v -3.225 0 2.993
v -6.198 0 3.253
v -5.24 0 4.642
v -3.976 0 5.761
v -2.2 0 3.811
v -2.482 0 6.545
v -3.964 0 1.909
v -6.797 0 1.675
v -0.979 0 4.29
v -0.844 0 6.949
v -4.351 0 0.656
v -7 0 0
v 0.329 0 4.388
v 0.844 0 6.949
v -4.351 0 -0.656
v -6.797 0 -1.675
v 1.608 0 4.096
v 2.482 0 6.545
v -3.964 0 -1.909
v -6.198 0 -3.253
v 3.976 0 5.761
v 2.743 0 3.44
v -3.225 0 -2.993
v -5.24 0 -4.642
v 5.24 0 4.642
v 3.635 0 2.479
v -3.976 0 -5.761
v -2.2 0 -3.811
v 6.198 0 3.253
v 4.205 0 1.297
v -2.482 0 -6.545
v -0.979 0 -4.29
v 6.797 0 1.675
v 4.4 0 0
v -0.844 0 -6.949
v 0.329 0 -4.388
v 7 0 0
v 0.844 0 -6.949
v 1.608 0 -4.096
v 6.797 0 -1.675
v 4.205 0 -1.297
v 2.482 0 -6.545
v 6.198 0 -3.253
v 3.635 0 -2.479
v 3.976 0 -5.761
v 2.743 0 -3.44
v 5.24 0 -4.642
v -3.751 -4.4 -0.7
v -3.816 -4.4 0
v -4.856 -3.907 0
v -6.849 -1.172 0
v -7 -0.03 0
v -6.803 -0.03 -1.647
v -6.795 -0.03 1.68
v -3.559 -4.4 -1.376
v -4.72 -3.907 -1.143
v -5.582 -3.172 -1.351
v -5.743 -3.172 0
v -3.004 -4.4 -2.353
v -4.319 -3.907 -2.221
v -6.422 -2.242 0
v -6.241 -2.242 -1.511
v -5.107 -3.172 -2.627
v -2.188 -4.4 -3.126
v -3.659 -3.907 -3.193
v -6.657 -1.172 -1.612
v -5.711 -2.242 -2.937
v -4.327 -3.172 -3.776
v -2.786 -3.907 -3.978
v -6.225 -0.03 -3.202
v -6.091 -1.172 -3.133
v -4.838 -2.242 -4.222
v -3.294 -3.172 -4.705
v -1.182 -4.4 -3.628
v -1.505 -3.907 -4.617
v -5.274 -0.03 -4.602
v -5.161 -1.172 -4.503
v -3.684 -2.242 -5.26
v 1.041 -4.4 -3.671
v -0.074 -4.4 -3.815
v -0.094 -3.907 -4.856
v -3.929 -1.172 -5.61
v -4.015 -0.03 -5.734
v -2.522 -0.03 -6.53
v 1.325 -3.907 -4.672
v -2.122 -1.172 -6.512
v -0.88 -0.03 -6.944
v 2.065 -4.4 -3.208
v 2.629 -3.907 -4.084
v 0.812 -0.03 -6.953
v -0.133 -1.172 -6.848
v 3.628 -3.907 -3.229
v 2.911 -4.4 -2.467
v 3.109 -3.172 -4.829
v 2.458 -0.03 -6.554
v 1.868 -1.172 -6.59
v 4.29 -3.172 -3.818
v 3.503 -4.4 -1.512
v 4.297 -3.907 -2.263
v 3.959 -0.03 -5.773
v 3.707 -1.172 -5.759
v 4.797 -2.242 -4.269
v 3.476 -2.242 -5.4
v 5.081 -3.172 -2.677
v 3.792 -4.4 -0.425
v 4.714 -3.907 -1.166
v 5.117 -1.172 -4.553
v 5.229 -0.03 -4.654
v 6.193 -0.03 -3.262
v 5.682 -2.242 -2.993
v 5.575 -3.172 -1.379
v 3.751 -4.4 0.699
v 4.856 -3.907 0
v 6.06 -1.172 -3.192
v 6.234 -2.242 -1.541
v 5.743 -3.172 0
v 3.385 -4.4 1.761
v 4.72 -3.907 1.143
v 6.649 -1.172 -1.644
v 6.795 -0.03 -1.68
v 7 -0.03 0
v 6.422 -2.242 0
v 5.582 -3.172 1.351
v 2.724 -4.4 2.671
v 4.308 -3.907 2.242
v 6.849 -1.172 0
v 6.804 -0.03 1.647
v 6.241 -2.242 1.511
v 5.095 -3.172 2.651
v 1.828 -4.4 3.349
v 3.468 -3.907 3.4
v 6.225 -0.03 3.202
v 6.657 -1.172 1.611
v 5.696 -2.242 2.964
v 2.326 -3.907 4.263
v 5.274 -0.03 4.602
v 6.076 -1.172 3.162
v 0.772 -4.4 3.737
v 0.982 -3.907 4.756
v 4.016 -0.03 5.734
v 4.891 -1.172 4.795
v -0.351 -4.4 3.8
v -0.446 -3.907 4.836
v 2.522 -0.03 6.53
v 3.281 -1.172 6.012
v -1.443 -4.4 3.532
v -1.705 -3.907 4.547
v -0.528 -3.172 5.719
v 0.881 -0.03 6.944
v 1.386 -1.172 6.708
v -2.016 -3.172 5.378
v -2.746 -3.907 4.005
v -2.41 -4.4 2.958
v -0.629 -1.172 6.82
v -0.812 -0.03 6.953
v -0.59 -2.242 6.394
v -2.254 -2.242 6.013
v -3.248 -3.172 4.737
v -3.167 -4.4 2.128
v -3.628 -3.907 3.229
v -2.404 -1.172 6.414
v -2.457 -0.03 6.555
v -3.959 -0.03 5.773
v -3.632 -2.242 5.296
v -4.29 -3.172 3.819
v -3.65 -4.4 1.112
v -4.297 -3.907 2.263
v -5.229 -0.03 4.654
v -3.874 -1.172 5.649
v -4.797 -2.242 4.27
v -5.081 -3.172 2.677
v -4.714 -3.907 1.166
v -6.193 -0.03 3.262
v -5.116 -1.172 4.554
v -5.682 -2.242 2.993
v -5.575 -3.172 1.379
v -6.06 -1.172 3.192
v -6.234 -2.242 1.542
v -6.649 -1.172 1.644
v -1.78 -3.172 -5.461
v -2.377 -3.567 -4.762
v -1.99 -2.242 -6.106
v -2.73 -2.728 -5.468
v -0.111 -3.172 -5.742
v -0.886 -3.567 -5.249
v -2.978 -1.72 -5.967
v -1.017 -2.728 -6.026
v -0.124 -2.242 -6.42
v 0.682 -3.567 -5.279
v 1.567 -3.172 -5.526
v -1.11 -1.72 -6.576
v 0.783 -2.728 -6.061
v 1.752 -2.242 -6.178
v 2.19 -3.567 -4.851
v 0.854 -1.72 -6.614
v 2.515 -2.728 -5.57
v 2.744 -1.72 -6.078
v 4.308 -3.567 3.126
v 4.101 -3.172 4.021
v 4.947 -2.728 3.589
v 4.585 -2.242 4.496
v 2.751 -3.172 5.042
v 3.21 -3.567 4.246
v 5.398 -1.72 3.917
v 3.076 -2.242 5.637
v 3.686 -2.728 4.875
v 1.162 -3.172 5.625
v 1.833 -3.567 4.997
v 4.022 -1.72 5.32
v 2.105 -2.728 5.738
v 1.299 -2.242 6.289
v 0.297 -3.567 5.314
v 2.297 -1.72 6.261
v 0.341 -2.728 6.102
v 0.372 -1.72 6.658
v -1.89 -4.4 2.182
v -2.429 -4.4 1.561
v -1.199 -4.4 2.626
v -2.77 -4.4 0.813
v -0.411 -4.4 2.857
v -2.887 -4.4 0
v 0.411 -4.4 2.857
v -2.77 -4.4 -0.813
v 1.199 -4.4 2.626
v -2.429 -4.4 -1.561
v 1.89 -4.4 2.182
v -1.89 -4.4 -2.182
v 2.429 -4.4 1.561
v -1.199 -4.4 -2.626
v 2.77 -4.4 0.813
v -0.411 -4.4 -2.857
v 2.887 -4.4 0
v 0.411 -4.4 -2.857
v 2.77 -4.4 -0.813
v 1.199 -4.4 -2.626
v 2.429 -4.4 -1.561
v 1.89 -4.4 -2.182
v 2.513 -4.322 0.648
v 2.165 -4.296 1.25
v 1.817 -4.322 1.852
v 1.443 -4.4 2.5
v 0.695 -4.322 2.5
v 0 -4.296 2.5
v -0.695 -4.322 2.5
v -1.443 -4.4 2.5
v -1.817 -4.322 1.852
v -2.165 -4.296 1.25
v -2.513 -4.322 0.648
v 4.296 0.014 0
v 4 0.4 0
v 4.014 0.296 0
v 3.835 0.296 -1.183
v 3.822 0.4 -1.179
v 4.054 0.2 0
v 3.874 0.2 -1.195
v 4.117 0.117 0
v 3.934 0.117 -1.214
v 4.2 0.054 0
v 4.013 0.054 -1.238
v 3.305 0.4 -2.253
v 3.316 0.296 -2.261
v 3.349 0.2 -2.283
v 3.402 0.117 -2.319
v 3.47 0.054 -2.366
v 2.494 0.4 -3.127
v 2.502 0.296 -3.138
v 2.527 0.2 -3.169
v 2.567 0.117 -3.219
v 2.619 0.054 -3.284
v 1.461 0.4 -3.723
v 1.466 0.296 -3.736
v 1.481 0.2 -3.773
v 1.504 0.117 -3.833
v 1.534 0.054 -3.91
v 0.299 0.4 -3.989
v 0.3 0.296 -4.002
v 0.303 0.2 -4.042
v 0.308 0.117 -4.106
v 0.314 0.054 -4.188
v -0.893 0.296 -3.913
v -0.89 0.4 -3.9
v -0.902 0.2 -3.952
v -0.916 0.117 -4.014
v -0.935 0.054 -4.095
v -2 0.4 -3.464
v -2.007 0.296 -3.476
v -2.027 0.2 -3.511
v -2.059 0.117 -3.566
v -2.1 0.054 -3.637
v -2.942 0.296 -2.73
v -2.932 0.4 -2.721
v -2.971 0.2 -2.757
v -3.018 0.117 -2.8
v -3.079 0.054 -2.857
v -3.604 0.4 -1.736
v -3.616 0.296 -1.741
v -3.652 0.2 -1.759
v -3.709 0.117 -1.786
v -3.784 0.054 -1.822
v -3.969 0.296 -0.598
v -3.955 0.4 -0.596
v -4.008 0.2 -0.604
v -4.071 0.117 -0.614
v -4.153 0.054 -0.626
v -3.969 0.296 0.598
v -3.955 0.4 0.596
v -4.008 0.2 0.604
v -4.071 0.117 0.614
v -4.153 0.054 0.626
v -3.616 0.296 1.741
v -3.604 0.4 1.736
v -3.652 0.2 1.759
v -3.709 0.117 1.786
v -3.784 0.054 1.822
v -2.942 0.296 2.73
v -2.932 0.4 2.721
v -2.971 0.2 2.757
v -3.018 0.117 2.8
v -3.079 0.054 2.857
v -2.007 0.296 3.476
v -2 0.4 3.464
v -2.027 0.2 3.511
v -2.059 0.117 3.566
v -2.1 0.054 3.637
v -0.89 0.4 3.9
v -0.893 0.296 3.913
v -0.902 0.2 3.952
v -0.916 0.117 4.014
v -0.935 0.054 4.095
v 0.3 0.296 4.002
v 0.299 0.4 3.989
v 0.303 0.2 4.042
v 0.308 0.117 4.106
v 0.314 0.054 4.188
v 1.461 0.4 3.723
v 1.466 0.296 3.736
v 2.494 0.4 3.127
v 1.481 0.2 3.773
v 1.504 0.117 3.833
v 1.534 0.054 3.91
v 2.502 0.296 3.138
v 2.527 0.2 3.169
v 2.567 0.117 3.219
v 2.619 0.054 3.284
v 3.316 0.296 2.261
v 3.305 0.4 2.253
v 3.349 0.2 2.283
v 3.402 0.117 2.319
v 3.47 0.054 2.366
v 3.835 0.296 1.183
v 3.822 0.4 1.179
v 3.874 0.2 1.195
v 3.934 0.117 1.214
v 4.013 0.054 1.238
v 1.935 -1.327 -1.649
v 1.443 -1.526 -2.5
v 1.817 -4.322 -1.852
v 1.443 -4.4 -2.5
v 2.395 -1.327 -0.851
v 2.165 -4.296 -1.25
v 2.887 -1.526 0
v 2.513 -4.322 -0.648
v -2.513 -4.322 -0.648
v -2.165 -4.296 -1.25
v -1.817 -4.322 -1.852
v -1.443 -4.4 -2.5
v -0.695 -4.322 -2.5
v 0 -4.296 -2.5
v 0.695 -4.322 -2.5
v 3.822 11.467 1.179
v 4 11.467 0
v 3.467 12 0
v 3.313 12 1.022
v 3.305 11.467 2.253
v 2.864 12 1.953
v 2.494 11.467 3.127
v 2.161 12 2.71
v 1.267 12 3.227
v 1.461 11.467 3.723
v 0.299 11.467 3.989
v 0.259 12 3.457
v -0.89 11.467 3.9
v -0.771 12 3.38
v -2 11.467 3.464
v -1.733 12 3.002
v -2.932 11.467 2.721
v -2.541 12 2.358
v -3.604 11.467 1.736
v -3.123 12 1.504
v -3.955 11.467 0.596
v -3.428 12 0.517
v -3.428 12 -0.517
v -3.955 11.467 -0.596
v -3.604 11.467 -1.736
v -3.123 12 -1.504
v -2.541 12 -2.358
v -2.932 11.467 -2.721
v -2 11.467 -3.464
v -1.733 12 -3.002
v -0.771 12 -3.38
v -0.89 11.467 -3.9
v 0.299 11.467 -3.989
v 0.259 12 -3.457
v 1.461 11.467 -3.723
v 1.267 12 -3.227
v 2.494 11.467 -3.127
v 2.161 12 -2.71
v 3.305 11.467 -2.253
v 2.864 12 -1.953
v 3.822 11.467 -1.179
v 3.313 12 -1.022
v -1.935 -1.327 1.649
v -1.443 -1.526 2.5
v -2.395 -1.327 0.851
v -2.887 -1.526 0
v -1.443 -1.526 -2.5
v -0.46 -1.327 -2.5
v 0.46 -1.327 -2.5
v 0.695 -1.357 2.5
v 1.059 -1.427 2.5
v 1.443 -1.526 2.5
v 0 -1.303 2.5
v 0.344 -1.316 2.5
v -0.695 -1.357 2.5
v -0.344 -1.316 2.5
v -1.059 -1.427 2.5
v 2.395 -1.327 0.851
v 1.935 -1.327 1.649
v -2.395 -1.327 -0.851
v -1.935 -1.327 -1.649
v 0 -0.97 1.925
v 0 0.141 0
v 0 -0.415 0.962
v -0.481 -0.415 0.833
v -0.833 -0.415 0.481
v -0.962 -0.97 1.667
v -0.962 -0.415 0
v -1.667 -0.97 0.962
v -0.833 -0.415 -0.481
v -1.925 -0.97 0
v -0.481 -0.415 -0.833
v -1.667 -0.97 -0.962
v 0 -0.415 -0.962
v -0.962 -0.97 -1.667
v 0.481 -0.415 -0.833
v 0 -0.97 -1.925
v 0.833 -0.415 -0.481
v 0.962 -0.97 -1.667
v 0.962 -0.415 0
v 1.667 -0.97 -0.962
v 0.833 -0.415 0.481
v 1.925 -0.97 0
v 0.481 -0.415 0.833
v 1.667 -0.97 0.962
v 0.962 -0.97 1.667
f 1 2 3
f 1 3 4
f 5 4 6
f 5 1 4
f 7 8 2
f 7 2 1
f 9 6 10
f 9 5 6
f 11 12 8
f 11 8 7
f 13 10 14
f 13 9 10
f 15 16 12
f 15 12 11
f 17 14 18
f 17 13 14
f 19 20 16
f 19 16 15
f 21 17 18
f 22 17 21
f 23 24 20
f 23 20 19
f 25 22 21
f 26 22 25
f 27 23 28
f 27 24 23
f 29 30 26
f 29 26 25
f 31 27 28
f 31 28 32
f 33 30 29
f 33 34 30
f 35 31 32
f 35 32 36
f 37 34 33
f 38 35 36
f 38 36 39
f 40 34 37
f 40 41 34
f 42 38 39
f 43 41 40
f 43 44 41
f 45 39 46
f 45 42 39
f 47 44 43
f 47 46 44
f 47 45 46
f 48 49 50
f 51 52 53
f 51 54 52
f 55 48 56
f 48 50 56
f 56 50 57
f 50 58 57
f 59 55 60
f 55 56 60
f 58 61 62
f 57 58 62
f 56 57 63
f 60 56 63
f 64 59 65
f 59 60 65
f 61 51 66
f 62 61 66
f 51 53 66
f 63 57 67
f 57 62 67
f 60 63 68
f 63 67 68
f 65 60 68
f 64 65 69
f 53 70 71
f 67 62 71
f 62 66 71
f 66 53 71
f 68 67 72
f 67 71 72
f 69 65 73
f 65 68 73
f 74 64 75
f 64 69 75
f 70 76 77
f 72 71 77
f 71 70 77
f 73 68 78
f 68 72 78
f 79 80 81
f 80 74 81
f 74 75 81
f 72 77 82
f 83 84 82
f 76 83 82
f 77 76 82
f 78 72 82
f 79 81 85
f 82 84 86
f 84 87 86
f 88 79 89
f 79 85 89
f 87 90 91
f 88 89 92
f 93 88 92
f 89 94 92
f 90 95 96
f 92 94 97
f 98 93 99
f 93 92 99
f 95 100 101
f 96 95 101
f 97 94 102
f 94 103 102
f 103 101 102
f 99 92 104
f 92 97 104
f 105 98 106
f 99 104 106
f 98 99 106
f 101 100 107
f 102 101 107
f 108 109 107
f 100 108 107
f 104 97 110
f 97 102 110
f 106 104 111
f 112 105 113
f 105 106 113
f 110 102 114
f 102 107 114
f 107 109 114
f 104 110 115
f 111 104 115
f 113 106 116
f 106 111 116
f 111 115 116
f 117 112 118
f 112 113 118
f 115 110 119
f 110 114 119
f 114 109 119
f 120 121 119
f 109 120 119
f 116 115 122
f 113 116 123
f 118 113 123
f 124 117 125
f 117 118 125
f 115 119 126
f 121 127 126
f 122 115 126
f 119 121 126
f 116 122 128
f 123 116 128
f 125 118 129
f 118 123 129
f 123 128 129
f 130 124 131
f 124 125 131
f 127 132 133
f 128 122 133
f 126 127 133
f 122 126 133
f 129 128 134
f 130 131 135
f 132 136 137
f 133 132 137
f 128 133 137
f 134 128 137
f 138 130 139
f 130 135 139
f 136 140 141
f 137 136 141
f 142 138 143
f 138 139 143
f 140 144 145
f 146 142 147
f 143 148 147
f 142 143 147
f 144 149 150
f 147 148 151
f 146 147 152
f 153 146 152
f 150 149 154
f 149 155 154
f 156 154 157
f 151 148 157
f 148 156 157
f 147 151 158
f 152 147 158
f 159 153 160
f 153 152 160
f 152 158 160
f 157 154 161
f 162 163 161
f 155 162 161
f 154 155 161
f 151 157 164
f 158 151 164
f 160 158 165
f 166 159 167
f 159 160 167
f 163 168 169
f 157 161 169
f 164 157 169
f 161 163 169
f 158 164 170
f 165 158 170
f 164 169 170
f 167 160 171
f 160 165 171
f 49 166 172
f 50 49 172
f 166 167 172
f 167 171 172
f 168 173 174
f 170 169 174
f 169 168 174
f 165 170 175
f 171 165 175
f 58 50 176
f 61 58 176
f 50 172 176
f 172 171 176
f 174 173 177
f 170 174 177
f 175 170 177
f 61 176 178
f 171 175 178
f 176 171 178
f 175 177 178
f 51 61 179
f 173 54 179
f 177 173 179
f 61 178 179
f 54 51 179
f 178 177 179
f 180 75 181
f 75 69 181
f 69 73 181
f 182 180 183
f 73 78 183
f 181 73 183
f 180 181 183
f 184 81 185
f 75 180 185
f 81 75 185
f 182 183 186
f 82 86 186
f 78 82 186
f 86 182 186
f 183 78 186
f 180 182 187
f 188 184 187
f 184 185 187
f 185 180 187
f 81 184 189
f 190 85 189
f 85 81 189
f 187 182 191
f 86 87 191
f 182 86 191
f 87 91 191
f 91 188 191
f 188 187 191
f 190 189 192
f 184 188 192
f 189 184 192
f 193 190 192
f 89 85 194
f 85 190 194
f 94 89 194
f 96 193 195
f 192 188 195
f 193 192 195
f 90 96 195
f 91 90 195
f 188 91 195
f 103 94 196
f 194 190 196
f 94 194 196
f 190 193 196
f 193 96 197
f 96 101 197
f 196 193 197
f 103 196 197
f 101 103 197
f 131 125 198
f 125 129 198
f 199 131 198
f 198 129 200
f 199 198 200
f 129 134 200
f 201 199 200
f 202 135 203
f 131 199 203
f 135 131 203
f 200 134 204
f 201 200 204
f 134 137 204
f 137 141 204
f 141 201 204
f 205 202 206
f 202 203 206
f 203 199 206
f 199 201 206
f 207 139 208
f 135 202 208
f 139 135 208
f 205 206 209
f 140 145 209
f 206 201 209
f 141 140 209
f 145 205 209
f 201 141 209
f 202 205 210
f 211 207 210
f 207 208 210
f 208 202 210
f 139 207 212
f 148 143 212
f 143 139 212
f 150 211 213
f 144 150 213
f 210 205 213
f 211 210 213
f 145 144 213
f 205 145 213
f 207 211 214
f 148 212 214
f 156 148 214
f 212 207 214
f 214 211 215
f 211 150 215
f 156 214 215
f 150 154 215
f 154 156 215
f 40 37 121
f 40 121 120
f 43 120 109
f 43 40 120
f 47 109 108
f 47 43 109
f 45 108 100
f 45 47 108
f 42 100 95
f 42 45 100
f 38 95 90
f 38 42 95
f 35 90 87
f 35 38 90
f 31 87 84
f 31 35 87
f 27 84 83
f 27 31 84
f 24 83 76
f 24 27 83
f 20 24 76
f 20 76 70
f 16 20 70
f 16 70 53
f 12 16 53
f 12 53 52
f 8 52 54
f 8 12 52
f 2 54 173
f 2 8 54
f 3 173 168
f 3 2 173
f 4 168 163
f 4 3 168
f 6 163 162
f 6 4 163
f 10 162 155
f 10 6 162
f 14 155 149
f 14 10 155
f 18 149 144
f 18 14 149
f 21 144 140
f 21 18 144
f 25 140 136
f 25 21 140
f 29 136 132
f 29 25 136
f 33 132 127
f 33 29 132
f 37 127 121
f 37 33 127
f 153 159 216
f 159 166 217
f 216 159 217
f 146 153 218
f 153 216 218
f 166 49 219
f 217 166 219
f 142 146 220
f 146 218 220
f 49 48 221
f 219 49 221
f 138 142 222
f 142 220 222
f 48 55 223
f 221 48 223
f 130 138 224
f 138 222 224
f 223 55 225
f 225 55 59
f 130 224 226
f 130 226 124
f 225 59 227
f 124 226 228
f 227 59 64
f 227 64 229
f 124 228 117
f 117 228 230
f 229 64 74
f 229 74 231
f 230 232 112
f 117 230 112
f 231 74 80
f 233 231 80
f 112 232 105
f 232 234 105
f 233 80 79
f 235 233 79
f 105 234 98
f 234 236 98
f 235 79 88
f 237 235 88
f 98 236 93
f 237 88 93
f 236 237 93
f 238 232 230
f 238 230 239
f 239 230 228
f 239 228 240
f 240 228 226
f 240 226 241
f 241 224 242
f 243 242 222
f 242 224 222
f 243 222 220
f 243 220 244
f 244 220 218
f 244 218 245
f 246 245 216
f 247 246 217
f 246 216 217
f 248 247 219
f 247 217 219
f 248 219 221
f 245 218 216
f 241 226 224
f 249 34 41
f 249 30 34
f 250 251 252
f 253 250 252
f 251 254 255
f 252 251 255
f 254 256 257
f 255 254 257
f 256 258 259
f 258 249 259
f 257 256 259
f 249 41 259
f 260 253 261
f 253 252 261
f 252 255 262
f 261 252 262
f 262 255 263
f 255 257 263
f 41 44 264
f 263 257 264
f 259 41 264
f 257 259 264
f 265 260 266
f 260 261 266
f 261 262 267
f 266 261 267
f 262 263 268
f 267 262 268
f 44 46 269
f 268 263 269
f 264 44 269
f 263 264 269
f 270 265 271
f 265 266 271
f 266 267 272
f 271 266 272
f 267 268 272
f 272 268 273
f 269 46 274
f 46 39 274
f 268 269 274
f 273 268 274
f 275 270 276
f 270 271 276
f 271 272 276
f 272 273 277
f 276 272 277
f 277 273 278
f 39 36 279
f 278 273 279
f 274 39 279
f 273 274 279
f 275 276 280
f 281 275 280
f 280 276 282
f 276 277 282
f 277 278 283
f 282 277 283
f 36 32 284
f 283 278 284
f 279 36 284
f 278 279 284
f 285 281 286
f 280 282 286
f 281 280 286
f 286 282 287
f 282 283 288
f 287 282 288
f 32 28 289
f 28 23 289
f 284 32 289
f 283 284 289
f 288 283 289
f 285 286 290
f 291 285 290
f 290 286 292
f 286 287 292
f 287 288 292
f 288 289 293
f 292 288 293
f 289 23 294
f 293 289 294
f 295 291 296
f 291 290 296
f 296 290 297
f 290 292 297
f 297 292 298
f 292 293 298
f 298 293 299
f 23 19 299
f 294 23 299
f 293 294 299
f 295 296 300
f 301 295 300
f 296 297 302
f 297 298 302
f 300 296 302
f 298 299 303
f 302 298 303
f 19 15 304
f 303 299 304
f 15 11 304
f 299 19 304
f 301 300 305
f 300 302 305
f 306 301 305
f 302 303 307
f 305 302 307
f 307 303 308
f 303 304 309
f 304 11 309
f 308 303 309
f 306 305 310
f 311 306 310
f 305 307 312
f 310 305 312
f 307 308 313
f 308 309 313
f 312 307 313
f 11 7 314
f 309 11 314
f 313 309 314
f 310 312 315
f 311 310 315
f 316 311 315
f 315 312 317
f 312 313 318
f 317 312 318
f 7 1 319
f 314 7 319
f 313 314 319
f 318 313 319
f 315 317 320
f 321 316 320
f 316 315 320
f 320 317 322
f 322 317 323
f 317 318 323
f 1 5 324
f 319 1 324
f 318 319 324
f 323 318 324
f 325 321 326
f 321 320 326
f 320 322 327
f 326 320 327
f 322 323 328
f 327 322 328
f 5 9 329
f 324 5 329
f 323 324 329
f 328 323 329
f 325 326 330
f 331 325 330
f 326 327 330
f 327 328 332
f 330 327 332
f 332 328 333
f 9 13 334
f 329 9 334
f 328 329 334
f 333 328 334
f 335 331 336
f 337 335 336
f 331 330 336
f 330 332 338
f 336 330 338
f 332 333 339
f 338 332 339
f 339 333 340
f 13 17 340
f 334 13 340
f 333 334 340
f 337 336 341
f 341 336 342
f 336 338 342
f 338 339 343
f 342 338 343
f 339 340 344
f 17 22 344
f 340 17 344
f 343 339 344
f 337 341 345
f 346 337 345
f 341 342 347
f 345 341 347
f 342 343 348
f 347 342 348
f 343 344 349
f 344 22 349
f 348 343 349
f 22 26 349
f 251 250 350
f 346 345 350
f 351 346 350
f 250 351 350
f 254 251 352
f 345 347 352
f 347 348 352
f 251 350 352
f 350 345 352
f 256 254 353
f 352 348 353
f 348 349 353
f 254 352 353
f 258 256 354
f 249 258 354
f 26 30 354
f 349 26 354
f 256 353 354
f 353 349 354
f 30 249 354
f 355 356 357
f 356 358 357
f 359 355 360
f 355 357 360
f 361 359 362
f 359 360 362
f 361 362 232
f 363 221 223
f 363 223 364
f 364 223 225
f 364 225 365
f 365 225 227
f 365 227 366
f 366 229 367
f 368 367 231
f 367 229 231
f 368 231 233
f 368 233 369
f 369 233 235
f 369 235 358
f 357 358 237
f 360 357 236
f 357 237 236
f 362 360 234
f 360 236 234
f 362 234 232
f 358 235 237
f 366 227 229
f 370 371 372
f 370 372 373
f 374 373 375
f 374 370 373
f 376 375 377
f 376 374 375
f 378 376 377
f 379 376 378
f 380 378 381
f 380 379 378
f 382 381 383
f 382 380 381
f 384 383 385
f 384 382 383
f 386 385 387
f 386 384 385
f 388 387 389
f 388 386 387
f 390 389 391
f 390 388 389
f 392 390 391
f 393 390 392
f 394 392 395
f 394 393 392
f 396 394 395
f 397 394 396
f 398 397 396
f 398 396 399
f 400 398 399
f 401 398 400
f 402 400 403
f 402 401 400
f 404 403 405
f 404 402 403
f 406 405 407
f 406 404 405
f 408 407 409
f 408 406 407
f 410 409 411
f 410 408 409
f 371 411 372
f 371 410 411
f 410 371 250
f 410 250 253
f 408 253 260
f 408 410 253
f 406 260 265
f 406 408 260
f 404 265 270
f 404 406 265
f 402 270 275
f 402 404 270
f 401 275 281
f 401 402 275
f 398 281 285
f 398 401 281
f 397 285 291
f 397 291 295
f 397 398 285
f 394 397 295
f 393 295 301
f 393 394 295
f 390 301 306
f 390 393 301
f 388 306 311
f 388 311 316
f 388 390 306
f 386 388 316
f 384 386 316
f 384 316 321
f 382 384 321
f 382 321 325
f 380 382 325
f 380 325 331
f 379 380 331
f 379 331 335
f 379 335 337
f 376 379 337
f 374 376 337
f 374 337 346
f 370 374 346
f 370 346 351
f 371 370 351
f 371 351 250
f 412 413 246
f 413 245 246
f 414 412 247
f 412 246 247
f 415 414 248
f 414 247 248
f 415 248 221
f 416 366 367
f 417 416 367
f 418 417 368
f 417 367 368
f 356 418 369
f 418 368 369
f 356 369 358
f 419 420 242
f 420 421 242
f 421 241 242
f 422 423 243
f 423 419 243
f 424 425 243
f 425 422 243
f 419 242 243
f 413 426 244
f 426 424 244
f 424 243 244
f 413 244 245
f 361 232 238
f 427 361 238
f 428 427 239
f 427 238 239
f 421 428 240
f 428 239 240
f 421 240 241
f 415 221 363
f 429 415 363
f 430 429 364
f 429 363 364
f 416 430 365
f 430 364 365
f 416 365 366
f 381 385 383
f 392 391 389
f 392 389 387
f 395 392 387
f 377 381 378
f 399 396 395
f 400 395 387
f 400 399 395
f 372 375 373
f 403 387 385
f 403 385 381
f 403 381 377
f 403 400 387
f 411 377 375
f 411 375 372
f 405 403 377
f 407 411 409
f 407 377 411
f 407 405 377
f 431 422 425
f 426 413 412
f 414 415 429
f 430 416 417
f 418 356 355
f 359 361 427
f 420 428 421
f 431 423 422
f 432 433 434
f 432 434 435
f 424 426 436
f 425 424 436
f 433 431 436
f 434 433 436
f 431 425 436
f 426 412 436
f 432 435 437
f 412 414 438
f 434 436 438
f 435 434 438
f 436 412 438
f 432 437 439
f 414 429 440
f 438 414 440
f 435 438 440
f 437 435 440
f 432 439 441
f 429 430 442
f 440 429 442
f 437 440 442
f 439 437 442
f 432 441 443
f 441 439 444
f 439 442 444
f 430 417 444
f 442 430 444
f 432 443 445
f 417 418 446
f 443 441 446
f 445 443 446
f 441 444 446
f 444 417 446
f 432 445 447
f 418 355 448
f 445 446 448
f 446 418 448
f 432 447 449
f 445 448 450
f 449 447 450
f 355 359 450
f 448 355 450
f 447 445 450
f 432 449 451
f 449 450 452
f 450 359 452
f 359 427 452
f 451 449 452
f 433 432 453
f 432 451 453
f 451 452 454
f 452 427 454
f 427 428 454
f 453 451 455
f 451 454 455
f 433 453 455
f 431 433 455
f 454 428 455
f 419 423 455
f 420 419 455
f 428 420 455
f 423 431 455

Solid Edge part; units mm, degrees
sketch "Sketch1" plane through (0, 0, 0) normal (0, 0, 1) x (1, 0, 0)
  line L0 (4, 0) -> (4, 12)
  line L1 (0, 12) -> (4, 12)
  line L2 (0, 0) -> (0, 12)
  line L3 (0, 0) -> (0, -4.4)
  line L4 (0, -4.4) -> (7, -4.4)
  line L5 (7, -4.4) -> (7, 0)
  line L6 (7, 0) -> (4, 0)
revolve "RevolvedProtrusion1" add sketch "Sketch1" angle 360 about axis through (0, 0, 0) along (0, 1, 0)
sketch "Sketch2" plane through (0, 0, 0) normal (1, 0, 0) x (0, 1, 0)
  line L0 (-4.4, 3.3615) -> (-1.8, 3.3615)
  line L1 (0.1408, 0) -> (-1.8, 3.3615)
  line L2 (-4.4, 0) -> (0.1408, 0)
  line L3 (-4.4, 0) -> (-4.4, 3.3615)
revolve "RevolvedCutout1" cut sketch "Sketch2" angle 360 about axis through (0, -4.5, 0) along (0, 1, 0)
sketch "Sketch3" plane through (0, -4.4, 0) normal (0, -1, 0) x (0, 0, 1)
  circle A0 centre (0, 0) radius 3.3615
  line L0 (-2.5, -1.4434) -> (0, -2.8868)
  line L1 (0, -2.8868) -> (2.5, -1.4434)
  line L2 (2.5, -1.4434) -> (2.5, 1.4434)
  line L3 (2.5, 1.4434) -> (0, 2.8868)
  line L4 (0, 2.8868) -> (-2.5, 1.4434)
  line L5 (-2.5, 1.4434) -> (-2.5, -1.4434)
  dimension "D1" = 5
extrude "Protrusion1" add sketch "Sketch3" against normal up to next
sketch "Sketch4" plane through (0, 0, 0) normal (0, 0, 1) x (1, 0, 0)
  line L0 (-2.8868, -4.4) -> (0, -4.4)
  line L1 (0, -4.4) -> (0, -3.6265)
  line L2 (0, -3.6265) -> (-2.8868, -4.4)
revolve "RevolvedCutout2" cut sketch "Sketch4" angle 360 about axis through (0, -4.5, 0) along (0, 1, 0)
fillet "Round1" radius 0.4 1 edges at (0, 0, -4)
chamfer "倒斜角_2" distance 0.5333 angle 45 1 edges at (0, 12, -4)
cosmetic_thread "螺纹_3" size "M8" thread depth 9.5
sketch "Sketch5" plane through (0, 0, 0) normal (0, 0, 1) x (1, 0, 0)
  arc A0 (-3.8153, -4.4) -> (-7, 0) centre (-2.3681, 0) cw
revolve "RevolvedCutout3" cut sketch "Sketch5" angle 360 about axis through (0, 0, 0) along (0, -1, 0) material side at (-6.1609, -2.7452, 0)
